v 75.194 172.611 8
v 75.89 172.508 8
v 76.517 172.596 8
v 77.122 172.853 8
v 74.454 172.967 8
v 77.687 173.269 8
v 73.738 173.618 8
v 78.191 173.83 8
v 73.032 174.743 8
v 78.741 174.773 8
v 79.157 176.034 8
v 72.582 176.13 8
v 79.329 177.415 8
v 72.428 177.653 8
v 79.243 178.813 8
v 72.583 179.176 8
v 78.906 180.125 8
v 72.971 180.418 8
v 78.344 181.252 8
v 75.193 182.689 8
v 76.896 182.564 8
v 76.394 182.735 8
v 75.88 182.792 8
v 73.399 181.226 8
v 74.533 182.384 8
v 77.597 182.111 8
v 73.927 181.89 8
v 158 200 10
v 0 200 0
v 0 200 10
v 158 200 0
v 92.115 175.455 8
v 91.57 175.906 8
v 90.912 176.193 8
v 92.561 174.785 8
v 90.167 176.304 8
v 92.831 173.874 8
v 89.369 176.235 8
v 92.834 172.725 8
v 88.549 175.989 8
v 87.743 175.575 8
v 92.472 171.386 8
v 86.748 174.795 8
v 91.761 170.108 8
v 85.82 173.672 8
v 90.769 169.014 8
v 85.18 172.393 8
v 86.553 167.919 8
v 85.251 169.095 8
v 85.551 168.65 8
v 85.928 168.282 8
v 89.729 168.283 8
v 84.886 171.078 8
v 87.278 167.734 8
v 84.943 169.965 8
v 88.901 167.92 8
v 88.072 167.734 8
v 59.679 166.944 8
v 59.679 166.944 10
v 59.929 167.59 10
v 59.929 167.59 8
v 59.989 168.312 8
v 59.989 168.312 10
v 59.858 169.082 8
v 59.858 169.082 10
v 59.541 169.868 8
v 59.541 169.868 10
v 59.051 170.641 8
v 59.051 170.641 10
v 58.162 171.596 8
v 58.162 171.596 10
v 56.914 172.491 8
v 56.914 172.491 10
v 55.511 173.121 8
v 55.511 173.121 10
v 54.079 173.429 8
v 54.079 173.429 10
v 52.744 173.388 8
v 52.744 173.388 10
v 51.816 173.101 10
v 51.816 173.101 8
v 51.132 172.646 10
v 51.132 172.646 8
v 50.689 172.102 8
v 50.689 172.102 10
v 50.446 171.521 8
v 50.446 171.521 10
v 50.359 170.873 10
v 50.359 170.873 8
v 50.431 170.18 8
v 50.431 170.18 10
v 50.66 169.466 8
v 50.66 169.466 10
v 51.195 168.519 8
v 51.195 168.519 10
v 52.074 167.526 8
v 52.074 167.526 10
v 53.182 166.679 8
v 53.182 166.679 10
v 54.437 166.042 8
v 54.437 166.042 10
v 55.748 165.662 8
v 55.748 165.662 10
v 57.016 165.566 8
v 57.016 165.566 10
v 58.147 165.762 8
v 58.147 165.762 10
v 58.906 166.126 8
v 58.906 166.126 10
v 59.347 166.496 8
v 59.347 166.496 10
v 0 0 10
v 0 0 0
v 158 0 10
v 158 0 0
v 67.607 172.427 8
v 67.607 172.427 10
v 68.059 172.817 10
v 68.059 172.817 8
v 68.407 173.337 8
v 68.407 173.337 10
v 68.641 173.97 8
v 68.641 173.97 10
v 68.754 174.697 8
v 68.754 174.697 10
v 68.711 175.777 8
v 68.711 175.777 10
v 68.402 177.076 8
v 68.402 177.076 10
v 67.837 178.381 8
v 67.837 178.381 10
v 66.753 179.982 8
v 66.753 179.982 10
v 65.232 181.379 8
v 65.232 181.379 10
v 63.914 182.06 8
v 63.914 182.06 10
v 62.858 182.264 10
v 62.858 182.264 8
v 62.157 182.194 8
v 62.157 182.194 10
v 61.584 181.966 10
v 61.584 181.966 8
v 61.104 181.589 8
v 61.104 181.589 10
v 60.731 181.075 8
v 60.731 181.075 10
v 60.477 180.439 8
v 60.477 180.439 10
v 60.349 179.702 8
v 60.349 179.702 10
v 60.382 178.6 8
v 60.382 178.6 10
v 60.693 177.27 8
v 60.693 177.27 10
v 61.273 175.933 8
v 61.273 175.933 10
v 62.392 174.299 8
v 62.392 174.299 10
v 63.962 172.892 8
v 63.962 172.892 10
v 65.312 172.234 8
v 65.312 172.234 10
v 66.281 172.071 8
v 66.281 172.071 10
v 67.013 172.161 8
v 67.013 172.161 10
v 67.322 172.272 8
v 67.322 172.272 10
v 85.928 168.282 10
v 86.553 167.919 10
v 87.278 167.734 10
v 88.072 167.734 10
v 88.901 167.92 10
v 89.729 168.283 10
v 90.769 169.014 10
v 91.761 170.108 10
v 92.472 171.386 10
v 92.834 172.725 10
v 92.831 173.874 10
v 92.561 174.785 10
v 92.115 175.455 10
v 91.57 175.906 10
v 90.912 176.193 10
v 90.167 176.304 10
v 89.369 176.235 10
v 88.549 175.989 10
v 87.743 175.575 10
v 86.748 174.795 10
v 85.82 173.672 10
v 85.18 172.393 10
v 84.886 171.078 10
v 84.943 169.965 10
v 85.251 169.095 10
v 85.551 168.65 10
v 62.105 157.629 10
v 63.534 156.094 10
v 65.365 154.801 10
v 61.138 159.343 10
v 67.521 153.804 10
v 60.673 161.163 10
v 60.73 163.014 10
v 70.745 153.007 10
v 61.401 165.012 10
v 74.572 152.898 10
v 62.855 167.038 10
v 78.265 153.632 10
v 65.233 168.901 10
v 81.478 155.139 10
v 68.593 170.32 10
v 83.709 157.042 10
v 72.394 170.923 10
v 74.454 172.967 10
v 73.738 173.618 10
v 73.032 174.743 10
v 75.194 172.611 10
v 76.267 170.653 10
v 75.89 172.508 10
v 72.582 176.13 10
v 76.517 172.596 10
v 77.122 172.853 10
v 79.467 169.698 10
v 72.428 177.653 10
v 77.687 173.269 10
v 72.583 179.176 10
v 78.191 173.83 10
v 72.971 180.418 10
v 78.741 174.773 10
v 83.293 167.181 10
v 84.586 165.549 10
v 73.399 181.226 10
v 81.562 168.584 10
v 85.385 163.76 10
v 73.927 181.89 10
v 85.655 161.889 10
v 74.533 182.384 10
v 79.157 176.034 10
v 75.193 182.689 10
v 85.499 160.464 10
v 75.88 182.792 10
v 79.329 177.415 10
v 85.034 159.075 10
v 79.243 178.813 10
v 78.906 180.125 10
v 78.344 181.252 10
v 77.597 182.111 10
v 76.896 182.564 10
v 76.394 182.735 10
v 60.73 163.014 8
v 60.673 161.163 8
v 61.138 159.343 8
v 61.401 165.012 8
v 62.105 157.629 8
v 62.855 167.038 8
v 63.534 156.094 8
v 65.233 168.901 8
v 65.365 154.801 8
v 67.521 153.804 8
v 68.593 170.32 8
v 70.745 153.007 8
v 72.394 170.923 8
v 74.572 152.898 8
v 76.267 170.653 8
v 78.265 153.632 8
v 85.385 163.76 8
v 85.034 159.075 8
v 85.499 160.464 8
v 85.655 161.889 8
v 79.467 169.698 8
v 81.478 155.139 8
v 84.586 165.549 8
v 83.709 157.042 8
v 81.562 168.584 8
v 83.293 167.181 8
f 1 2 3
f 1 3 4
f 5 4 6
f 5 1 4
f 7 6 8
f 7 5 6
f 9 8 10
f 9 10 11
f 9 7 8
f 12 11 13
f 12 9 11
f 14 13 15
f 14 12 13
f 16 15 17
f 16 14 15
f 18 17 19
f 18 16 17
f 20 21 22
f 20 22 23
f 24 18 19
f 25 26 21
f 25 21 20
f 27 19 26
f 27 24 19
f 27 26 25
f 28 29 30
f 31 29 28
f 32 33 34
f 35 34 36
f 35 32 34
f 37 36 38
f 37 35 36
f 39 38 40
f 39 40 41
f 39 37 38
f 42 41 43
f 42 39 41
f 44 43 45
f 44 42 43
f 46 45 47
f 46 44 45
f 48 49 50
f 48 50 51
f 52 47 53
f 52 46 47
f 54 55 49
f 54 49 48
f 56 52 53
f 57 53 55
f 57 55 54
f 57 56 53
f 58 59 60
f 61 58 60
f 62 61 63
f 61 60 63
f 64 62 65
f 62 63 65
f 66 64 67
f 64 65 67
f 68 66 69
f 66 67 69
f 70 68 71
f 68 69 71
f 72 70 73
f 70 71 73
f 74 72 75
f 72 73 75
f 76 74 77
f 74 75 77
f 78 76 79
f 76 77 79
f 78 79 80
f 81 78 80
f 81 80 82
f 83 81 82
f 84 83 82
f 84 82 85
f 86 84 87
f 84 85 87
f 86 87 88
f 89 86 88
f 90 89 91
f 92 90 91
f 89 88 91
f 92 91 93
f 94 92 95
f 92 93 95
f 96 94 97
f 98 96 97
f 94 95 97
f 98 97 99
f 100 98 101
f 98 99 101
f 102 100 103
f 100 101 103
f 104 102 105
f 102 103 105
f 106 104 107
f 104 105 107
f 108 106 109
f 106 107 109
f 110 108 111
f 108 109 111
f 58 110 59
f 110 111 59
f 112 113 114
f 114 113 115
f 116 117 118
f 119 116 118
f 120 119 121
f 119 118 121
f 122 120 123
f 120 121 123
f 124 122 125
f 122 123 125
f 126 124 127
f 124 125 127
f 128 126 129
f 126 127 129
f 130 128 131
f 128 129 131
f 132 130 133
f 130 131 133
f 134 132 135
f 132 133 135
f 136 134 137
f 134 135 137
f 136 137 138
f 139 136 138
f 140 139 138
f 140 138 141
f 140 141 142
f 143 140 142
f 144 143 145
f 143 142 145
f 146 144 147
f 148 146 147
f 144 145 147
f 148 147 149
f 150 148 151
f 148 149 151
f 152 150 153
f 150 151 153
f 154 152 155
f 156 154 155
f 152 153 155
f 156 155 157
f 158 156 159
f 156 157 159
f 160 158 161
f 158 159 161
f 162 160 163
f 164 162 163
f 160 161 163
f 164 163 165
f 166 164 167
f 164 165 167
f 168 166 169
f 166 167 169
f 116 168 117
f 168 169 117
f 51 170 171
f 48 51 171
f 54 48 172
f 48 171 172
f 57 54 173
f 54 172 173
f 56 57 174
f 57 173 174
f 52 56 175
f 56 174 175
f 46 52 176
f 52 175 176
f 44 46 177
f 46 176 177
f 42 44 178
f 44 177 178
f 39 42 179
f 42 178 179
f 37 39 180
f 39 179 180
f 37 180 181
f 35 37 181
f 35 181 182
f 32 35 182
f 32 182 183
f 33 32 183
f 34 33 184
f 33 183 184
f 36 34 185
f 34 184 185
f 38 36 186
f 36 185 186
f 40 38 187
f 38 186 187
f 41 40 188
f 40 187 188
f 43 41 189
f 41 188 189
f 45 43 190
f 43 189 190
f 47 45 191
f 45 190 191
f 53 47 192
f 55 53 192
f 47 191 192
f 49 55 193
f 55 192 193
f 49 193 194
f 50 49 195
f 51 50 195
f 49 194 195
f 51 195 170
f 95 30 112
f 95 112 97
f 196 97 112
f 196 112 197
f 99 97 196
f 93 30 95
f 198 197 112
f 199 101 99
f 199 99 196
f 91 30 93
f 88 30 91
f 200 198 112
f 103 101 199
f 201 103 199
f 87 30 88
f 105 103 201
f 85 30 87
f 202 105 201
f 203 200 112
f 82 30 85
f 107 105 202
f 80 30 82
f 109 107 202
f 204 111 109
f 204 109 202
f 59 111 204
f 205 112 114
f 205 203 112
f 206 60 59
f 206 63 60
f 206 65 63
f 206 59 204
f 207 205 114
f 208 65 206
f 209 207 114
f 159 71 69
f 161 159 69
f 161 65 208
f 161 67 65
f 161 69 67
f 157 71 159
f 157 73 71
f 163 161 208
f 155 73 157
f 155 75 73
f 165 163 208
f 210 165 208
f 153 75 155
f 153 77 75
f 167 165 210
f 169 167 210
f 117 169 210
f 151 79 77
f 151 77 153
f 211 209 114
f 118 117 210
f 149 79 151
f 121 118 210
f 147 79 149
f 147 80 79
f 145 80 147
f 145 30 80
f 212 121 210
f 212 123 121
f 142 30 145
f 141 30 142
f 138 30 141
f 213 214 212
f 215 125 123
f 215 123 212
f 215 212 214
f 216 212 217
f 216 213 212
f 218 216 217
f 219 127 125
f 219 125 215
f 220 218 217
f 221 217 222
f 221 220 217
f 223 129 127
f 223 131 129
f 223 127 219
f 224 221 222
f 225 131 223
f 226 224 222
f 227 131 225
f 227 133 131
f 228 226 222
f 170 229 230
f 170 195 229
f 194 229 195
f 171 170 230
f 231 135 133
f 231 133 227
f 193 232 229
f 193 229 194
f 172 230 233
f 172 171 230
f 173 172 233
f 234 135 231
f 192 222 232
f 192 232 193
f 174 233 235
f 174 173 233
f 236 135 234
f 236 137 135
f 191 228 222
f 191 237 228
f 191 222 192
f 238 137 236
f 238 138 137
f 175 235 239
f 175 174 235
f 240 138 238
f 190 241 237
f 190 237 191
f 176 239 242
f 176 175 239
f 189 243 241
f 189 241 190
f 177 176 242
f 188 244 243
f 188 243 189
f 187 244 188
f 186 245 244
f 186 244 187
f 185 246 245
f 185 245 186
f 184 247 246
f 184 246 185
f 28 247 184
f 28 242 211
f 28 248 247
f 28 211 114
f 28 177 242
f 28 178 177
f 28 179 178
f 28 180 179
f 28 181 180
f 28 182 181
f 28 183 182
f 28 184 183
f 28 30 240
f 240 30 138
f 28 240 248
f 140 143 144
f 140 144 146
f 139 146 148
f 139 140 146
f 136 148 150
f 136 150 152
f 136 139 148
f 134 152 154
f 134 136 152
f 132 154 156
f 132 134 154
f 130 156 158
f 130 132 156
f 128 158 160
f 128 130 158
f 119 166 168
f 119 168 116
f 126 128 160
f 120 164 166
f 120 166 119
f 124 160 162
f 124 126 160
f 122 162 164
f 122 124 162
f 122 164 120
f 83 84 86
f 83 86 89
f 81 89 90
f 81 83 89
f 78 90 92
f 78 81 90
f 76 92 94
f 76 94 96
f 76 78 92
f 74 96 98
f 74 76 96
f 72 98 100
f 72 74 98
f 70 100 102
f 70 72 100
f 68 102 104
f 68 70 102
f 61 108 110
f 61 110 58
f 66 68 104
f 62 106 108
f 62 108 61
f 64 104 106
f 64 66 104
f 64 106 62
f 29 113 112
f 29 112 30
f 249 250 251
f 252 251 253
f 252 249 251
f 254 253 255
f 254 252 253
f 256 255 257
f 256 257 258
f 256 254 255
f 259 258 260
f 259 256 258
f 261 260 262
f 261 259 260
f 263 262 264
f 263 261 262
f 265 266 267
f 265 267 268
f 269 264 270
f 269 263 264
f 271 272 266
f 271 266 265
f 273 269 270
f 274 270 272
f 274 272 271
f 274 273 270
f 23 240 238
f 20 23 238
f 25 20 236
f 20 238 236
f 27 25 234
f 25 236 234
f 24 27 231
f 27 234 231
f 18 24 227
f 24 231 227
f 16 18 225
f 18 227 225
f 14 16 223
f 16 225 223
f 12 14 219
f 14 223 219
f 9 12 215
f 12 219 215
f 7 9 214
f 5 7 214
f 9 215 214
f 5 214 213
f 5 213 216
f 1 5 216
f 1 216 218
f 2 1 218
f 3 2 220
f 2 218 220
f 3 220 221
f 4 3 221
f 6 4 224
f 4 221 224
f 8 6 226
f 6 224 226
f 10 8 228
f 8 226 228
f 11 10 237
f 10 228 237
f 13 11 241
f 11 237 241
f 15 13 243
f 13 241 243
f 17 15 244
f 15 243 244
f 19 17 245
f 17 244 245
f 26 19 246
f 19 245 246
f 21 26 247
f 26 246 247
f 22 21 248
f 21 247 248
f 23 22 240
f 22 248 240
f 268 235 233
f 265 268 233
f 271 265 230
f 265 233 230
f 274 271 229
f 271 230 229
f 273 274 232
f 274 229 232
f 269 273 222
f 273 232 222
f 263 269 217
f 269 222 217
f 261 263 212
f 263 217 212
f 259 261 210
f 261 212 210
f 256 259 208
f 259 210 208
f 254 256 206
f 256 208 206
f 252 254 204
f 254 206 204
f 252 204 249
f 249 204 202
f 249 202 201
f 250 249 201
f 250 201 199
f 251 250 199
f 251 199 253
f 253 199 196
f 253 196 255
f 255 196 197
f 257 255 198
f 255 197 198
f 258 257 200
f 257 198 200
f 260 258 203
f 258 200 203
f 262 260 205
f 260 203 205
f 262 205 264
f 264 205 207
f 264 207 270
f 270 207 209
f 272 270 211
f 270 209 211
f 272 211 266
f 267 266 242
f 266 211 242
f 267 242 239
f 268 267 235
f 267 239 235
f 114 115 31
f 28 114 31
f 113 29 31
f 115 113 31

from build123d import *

# Parameters (mm, degrees)
SKETCH_1_W          = 158
SKETCH_1_H          = 200
EXTRUDE_1_DEPTH     = 10
SKETCH_2_RX         = 12.510915337
SKETCH_2_RY         = 9.050449393
SKETCH_2_RX_2       = 5.182590636
SKETCH_2_RY_2       = 3.452265776
SKETCH_2_RX_3       = 5.641827611
SKETCH_2_RX_4       = 5.141705424
SKETCH_2_RX_5       = 4.748897539
CUT_EXTRUDE_1_DEPTH = 2


with BuildPart() as part:
    # 草圖1 → 填料-伸長1 (new body)
    with BuildSketch(Plane.XY):
        with Locations((79, 100)):
            Rectangle(SKETCH_1_W, SKETCH_1_H)
    extrude(amount=EXTRUDE_1_DEPTH)

    # 草圖2 → 除料-伸長1 (cut)
    with BuildSketch(Plane.XY.offset(10)):
        with Locations((73.143826864, 161.889102465)):
            Ellipse(SKETCH_2_RX, SKETCH_2_RY)
        with Locations(Location((55.175550619, 169.508366321), (0, 0, -29.658527045))):
            Ellipse(SKETCH_2_RX_2, SKETCH_2_RY_2)
        with Locations(Location((64.548995649, 177.167911946), (0, 0, -57.180664348))):
            Ellipse(SKETCH_2_RX_3, SKETCH_2_RY_2)
        with Locations(Location((75.880101936, 177.650055904), (0, 0, 90))):
            Ellipse(SKETCH_2_RX_4, SKETCH_2_RY_2)
        with Locations(Location((88.871515974, 172.008159222), (0, 0, -128.304052106))):
            Ellipse(SKETCH_2_RX_5, SKETCH_2_RY_2)
    extrude(amount=-CUT_EXTRUDE_1_DEPTH, mode=Mode.SUBTRACT)


solid = part.part
